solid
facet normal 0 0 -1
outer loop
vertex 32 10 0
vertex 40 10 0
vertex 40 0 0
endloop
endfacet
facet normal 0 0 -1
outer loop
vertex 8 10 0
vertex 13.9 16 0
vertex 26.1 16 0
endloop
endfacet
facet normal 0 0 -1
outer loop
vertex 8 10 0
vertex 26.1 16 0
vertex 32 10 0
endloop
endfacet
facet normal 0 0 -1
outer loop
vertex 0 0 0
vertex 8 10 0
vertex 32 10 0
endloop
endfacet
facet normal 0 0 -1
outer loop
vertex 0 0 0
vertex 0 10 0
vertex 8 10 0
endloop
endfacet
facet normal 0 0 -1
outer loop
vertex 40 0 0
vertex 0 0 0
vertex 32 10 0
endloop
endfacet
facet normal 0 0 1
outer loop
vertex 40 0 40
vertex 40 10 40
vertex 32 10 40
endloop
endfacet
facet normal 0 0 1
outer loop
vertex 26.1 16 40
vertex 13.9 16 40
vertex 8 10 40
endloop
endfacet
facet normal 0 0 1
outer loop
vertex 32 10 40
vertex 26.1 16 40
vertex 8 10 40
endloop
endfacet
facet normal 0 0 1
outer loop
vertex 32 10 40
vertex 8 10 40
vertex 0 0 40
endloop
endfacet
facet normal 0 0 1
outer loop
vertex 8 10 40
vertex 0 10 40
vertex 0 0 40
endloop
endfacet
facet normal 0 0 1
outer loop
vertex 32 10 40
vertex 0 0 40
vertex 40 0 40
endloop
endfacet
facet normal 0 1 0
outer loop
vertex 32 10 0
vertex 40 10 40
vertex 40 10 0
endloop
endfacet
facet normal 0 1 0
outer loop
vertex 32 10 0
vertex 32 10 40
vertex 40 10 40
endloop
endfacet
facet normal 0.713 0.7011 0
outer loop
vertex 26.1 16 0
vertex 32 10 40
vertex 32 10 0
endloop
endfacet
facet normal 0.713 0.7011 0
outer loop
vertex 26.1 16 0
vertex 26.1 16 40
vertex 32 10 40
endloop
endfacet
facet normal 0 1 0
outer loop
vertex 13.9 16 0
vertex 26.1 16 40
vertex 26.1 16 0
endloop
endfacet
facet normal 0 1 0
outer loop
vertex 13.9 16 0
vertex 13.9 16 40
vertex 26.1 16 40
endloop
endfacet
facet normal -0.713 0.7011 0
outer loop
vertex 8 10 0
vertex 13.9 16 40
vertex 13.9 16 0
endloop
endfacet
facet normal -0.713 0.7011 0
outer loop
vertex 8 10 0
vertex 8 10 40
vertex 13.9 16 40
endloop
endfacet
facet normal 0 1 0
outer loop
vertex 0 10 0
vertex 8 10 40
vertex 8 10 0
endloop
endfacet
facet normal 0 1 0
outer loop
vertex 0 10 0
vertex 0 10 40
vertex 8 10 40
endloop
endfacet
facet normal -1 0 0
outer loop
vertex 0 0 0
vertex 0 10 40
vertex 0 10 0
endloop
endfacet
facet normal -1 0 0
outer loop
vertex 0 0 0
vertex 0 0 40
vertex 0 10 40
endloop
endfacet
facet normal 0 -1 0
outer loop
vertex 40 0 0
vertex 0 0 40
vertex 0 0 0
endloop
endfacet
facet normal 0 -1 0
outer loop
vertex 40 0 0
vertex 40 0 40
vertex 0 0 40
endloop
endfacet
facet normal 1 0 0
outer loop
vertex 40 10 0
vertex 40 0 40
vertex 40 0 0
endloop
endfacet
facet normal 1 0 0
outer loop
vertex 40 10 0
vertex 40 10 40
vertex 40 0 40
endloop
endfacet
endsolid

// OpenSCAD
$fn = 32;

// ----------------------------------------------------------------------
// V guide rail: dovetail, 40 mm wide
// ----------------------------------------------------------------------

// --- parameters (mm) ---
rail_w = 40;              // rail width, X
base_t = 10;              // base plate thickness
v_depth = 6;              // V feature depth / height
v_half_w = 12;            // half width of the V at the base face
plate_t = 40;             // rail length, Z (the extrusion height)
top_half_w = 6.1;         // half width at the dovetail top

dovetail_base = 2 * v_half_w;  // dovetail width at the base
dovetail_top = 2 * top_half_w;  // dovetail width at the top

profile = [[0, 0], [40, 0], [40, 10], [32, 10], [26.1, 16], [13.9, 16], [8, 10], [0, 10]];  // primary outline, 8 points, counter clockwise

// --- the one profile operation ---
linear_extrude(height = plate_t) polygon(points = profile);
